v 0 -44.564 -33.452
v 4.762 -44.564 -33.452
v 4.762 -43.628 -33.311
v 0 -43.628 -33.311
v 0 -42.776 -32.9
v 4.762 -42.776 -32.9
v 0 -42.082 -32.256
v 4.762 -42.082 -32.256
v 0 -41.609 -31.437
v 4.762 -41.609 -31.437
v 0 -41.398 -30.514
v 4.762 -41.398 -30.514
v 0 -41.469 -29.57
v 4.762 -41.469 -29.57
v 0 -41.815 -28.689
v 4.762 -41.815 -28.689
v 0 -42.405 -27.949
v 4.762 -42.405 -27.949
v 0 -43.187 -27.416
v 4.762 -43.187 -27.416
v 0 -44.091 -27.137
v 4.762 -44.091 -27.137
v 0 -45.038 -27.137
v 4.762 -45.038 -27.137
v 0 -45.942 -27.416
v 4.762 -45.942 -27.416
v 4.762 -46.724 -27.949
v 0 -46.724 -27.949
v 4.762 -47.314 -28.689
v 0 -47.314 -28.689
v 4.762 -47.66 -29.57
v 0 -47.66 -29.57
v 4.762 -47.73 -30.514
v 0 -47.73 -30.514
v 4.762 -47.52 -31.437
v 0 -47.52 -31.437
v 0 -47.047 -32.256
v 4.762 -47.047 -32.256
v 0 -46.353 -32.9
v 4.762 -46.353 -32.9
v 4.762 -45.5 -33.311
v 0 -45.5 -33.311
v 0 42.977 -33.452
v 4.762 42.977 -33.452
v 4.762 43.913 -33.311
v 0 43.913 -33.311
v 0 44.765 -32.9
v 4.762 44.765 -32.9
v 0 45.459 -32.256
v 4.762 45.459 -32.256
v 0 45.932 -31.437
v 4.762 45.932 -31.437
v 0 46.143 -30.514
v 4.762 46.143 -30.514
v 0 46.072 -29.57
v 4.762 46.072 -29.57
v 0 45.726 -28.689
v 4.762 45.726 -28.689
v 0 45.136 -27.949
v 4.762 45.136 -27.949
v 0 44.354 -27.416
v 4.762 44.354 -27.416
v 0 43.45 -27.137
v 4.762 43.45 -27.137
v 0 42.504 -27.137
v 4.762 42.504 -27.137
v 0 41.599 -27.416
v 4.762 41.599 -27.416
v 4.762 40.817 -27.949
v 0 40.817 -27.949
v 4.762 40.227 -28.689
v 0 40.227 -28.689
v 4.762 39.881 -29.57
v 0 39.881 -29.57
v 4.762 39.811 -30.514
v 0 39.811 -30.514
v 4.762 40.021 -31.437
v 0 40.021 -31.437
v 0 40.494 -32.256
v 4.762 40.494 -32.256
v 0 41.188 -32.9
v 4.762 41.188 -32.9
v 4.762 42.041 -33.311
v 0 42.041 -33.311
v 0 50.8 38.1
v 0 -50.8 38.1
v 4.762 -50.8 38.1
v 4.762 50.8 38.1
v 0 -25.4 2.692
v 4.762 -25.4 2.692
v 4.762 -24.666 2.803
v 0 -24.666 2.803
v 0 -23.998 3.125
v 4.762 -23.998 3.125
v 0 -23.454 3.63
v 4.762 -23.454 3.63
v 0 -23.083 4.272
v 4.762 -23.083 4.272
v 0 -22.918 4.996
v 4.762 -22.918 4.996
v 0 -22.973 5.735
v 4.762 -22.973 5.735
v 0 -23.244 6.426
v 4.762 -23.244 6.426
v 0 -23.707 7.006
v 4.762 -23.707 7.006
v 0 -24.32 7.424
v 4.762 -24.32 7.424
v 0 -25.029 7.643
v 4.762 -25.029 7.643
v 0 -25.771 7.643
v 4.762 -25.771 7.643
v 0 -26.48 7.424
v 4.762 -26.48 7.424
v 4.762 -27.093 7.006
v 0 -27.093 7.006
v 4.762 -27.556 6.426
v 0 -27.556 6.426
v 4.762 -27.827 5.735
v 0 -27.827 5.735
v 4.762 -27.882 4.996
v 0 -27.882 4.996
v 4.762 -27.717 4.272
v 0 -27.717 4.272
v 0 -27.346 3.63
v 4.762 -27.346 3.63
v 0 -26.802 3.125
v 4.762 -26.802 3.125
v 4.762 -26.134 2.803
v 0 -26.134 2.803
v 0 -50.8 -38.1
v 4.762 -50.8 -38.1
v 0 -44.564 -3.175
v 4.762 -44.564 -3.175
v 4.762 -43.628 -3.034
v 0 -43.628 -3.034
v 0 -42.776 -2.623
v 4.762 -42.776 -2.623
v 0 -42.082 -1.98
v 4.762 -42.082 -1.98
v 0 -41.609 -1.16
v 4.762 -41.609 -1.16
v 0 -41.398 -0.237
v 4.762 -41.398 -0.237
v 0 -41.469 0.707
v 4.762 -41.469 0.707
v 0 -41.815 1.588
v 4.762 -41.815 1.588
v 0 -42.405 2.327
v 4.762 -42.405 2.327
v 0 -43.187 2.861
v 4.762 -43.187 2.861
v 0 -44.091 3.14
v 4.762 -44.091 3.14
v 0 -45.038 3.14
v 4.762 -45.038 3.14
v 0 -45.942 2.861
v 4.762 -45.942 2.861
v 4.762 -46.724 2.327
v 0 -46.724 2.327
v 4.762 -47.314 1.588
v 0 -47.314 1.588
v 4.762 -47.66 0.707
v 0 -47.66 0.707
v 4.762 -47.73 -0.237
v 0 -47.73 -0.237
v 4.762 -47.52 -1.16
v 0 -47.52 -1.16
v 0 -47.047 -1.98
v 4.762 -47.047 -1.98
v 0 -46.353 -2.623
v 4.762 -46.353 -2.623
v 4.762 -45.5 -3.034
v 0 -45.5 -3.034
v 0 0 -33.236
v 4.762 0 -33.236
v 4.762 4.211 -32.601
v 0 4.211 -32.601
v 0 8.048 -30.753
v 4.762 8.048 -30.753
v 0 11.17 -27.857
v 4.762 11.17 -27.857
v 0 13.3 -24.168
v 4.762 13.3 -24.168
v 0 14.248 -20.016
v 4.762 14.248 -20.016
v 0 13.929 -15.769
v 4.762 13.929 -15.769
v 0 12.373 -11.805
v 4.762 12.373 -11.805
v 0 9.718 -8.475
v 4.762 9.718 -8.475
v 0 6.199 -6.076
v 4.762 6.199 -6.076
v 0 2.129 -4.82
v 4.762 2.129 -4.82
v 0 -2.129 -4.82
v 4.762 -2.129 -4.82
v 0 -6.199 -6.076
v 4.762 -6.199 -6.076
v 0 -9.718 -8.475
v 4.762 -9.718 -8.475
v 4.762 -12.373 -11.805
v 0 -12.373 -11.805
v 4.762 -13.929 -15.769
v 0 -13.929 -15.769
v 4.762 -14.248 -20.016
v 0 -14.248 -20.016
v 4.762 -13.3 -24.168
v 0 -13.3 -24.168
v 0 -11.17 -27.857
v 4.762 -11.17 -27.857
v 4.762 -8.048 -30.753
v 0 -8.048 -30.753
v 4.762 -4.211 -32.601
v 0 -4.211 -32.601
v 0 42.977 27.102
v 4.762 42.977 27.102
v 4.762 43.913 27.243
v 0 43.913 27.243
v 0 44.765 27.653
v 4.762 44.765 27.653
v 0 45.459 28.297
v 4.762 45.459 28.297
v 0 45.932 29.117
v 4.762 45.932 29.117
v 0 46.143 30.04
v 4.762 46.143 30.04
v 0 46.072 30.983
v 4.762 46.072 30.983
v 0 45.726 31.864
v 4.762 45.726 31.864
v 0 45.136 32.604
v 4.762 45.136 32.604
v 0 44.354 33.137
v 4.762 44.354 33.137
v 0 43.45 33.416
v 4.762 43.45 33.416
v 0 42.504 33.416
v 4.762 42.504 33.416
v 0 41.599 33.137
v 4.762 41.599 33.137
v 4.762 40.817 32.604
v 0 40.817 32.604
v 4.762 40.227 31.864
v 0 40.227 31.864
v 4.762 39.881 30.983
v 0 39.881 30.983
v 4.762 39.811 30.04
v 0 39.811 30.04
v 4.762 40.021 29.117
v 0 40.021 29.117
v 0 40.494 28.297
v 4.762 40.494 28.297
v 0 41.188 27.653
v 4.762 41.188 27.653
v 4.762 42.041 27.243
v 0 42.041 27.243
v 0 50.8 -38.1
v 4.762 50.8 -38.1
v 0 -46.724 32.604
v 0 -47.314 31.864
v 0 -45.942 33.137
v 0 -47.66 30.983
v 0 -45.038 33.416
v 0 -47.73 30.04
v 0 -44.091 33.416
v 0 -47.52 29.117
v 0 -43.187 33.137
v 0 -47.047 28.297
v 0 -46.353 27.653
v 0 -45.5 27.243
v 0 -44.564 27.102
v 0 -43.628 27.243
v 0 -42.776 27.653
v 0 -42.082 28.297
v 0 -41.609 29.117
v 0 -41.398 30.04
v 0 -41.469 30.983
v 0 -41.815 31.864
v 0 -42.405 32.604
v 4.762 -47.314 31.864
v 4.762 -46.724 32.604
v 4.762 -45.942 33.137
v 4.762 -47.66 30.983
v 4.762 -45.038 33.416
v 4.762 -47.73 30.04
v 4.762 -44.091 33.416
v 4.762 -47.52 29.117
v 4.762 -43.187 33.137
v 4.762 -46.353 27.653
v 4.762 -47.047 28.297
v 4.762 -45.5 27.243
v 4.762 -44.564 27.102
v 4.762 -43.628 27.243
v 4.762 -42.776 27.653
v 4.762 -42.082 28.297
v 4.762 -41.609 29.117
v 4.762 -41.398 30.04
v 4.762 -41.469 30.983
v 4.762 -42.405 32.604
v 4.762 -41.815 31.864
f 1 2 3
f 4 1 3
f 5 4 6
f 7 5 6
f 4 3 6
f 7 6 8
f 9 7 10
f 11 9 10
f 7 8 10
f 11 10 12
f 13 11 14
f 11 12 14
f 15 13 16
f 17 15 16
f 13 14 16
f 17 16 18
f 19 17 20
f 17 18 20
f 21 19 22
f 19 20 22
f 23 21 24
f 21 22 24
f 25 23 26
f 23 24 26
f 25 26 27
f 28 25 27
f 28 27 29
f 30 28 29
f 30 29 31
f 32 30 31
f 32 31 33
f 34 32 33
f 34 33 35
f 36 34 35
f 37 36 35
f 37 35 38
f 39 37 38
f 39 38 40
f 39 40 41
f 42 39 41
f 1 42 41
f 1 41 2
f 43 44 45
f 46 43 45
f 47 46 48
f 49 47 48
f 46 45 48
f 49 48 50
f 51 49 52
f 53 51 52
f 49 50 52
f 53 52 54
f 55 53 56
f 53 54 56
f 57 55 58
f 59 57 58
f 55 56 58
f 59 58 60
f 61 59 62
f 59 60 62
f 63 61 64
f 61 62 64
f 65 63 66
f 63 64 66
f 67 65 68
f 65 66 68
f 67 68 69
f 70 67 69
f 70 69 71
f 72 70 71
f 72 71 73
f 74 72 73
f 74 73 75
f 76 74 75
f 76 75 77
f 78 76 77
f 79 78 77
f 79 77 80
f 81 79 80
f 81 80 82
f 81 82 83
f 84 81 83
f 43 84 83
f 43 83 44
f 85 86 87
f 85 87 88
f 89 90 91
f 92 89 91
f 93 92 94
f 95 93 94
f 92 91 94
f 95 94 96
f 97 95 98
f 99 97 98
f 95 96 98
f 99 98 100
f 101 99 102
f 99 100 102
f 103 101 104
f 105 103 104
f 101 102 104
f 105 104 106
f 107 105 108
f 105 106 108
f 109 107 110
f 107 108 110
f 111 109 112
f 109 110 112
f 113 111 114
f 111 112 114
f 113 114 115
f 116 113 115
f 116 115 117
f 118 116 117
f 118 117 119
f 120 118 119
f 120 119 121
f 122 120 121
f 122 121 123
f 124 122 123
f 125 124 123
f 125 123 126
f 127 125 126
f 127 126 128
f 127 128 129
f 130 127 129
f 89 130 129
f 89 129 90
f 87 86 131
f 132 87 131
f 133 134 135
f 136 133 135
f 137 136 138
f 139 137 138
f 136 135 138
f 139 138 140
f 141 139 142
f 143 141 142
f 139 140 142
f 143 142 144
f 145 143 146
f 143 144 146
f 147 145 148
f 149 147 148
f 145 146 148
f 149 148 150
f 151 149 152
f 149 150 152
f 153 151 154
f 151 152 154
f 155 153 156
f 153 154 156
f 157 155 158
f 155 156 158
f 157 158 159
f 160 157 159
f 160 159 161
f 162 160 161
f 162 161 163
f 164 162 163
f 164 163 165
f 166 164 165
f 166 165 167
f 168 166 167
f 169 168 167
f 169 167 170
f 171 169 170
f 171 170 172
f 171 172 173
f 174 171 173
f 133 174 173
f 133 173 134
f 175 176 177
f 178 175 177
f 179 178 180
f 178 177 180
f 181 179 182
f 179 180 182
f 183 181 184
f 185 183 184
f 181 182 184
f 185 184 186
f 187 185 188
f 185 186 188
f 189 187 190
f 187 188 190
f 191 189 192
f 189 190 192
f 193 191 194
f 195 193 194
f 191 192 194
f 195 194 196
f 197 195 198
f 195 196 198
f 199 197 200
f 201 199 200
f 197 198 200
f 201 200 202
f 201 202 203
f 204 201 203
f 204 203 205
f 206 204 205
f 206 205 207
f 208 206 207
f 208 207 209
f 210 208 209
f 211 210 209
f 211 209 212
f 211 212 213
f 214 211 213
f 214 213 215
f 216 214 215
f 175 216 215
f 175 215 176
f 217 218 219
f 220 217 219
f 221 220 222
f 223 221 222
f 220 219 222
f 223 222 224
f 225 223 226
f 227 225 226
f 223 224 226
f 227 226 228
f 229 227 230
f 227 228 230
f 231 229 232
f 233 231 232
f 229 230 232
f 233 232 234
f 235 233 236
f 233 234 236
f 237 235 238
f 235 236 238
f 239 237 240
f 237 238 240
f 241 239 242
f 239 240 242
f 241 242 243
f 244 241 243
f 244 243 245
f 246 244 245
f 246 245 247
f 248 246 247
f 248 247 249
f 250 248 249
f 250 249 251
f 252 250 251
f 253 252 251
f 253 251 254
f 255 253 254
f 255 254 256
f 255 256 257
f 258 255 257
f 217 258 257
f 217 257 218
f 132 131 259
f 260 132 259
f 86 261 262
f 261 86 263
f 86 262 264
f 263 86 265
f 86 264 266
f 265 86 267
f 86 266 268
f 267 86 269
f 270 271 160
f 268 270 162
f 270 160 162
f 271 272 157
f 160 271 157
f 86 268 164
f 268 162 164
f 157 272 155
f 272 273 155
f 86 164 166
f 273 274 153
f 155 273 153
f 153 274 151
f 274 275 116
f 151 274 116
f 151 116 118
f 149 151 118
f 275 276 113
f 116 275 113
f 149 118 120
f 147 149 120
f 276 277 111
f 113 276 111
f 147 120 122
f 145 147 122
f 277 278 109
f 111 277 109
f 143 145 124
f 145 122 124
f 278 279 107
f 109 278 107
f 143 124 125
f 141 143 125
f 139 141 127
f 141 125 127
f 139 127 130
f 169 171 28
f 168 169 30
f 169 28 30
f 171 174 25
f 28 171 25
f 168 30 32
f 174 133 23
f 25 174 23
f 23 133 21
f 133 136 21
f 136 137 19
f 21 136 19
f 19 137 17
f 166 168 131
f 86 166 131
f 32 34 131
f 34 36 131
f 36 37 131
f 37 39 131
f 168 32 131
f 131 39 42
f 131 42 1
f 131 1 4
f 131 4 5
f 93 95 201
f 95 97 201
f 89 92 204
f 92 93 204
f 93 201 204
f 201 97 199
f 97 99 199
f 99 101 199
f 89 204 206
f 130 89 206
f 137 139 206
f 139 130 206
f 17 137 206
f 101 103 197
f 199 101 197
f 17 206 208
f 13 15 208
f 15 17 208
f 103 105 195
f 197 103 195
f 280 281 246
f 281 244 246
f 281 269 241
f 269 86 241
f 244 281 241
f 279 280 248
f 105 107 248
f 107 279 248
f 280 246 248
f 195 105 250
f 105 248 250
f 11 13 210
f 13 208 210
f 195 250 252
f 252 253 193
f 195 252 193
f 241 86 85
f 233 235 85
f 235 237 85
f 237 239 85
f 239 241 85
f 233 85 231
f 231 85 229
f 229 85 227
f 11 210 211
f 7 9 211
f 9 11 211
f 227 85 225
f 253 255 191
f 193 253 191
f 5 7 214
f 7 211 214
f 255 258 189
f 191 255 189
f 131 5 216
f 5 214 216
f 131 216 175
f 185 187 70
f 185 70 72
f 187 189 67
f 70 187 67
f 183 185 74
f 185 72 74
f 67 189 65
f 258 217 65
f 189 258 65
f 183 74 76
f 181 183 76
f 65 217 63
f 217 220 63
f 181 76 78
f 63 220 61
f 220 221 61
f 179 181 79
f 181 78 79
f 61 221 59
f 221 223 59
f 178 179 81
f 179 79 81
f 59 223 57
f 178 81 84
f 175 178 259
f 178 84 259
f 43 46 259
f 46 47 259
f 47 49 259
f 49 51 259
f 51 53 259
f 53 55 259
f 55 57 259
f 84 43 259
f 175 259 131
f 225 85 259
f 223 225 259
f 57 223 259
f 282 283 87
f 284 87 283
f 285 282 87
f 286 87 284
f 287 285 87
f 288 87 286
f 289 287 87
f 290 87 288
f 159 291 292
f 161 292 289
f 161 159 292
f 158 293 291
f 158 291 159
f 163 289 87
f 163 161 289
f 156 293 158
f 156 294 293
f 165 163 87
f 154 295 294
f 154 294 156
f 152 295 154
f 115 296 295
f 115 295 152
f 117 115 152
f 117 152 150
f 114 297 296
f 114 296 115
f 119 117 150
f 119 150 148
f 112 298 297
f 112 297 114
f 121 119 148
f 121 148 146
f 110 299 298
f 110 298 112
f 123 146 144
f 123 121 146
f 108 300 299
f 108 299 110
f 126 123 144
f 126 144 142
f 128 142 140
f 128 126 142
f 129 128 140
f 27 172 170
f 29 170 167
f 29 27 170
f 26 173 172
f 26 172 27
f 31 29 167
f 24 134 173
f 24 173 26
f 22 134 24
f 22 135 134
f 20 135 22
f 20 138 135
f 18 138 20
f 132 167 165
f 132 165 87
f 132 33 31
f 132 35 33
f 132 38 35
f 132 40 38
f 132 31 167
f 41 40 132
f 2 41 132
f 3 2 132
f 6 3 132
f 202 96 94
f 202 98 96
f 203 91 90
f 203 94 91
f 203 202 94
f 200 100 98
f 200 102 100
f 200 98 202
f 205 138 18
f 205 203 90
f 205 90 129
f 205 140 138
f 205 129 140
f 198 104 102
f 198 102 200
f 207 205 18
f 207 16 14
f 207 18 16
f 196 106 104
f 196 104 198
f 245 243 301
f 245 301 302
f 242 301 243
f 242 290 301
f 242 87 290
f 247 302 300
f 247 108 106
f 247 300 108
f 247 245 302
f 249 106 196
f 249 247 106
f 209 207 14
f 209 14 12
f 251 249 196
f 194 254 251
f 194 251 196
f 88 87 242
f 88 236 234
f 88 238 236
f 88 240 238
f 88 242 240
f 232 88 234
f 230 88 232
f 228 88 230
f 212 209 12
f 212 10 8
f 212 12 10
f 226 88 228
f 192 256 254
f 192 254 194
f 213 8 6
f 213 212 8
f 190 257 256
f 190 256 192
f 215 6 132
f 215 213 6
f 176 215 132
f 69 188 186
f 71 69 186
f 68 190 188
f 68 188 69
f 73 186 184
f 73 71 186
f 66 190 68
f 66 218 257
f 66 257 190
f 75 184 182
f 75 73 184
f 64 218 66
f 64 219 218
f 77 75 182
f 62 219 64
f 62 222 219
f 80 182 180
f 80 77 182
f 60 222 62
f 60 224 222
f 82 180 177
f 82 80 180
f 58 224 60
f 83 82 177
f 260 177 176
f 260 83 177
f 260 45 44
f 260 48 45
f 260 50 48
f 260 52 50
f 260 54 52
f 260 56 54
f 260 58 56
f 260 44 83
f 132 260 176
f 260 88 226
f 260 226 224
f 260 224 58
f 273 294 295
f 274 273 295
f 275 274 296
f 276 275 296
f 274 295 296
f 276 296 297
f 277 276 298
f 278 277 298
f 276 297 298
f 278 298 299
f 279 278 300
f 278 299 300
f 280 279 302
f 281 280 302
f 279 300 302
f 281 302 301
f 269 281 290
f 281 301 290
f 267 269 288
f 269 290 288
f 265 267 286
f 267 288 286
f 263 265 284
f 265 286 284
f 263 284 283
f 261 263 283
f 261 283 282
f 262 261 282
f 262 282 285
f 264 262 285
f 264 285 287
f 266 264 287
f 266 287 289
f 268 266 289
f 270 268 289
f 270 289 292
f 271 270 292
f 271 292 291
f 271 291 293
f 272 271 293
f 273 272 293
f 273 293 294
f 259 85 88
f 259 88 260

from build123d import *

# Parameters (mm, degrees)
SKETCH2_W           = 76.2
SKETCH2_H           = 101.6
BOSS_EXTRUDE1_DEPTH = 4.7625
SKETCH3_R           = 3.175
CUT_EXTRUDE1_DEPTH  = 6.35
SKETCH3_4_R         = 3.175
SKETCH3_4_R_2       = 14.2875
SKETCH3_4_R_3       = 2.4892
CUT_EXTRUDE2_DEPTH  = 6.35


with BuildPart() as part:
    # Sketch2 → Boss-Extrude1 (new body)
    with BuildSketch(Plane(origin=(0, 0, 0), x_dir=(0, 0, -1), z_dir=(1, 0, 0))):
        Rectangle(SKETCH2_W, SKETCH2_H)
    extrude(amount=BOSS_EXTRUDE1_DEPTH)

    # Sketch3 → Cut-Extrude1 (cut)
    with BuildSketch(Plane(origin=(4.7625, 0, 0), x_dir=(0, 0, -1), z_dir=(1, 0, 0))):
        with Locations((30.2768, 42.9768)):
            Circle(SKETCH3_R)
    extrude(amount=-CUT_EXTRUDE1_DEPTH, mode=Mode.SUBTRACT)

    # Sketch3<4> → Cut-Extrude2 (cut)
    with BuildSketch(Plane(origin=(4.7625, 0, 0), x_dir=(0, 0, -1), z_dir=(1, 0, 0))):
        with Locations((30.2768, -44.5643)):
            Circle(SKETCH3_4_R)
        with Locations((30.2768, 42.9768)):
            Circle(SKETCH3_4_R)
        with Locations((-30.2768, 42.9768)):
            Circle(SKETCH3_4_R)
        with Locations((-30.2768, -44.5643)):
            Circle(SKETCH3_4_R)
        with Locations((18.9484, 0)):
            Circle(SKETCH3_4_R_2)
        with Locations((-5.1816, -25.4)):
            Circle(SKETCH3_4_R_3)
        with Locations((0, -44.5643)):
            Circle(SKETCH3_4_R)
    extrude(amount=-CUT_EXTRUDE2_DEPTH, mode=Mode.SUBTRACT)


solid = part.part
